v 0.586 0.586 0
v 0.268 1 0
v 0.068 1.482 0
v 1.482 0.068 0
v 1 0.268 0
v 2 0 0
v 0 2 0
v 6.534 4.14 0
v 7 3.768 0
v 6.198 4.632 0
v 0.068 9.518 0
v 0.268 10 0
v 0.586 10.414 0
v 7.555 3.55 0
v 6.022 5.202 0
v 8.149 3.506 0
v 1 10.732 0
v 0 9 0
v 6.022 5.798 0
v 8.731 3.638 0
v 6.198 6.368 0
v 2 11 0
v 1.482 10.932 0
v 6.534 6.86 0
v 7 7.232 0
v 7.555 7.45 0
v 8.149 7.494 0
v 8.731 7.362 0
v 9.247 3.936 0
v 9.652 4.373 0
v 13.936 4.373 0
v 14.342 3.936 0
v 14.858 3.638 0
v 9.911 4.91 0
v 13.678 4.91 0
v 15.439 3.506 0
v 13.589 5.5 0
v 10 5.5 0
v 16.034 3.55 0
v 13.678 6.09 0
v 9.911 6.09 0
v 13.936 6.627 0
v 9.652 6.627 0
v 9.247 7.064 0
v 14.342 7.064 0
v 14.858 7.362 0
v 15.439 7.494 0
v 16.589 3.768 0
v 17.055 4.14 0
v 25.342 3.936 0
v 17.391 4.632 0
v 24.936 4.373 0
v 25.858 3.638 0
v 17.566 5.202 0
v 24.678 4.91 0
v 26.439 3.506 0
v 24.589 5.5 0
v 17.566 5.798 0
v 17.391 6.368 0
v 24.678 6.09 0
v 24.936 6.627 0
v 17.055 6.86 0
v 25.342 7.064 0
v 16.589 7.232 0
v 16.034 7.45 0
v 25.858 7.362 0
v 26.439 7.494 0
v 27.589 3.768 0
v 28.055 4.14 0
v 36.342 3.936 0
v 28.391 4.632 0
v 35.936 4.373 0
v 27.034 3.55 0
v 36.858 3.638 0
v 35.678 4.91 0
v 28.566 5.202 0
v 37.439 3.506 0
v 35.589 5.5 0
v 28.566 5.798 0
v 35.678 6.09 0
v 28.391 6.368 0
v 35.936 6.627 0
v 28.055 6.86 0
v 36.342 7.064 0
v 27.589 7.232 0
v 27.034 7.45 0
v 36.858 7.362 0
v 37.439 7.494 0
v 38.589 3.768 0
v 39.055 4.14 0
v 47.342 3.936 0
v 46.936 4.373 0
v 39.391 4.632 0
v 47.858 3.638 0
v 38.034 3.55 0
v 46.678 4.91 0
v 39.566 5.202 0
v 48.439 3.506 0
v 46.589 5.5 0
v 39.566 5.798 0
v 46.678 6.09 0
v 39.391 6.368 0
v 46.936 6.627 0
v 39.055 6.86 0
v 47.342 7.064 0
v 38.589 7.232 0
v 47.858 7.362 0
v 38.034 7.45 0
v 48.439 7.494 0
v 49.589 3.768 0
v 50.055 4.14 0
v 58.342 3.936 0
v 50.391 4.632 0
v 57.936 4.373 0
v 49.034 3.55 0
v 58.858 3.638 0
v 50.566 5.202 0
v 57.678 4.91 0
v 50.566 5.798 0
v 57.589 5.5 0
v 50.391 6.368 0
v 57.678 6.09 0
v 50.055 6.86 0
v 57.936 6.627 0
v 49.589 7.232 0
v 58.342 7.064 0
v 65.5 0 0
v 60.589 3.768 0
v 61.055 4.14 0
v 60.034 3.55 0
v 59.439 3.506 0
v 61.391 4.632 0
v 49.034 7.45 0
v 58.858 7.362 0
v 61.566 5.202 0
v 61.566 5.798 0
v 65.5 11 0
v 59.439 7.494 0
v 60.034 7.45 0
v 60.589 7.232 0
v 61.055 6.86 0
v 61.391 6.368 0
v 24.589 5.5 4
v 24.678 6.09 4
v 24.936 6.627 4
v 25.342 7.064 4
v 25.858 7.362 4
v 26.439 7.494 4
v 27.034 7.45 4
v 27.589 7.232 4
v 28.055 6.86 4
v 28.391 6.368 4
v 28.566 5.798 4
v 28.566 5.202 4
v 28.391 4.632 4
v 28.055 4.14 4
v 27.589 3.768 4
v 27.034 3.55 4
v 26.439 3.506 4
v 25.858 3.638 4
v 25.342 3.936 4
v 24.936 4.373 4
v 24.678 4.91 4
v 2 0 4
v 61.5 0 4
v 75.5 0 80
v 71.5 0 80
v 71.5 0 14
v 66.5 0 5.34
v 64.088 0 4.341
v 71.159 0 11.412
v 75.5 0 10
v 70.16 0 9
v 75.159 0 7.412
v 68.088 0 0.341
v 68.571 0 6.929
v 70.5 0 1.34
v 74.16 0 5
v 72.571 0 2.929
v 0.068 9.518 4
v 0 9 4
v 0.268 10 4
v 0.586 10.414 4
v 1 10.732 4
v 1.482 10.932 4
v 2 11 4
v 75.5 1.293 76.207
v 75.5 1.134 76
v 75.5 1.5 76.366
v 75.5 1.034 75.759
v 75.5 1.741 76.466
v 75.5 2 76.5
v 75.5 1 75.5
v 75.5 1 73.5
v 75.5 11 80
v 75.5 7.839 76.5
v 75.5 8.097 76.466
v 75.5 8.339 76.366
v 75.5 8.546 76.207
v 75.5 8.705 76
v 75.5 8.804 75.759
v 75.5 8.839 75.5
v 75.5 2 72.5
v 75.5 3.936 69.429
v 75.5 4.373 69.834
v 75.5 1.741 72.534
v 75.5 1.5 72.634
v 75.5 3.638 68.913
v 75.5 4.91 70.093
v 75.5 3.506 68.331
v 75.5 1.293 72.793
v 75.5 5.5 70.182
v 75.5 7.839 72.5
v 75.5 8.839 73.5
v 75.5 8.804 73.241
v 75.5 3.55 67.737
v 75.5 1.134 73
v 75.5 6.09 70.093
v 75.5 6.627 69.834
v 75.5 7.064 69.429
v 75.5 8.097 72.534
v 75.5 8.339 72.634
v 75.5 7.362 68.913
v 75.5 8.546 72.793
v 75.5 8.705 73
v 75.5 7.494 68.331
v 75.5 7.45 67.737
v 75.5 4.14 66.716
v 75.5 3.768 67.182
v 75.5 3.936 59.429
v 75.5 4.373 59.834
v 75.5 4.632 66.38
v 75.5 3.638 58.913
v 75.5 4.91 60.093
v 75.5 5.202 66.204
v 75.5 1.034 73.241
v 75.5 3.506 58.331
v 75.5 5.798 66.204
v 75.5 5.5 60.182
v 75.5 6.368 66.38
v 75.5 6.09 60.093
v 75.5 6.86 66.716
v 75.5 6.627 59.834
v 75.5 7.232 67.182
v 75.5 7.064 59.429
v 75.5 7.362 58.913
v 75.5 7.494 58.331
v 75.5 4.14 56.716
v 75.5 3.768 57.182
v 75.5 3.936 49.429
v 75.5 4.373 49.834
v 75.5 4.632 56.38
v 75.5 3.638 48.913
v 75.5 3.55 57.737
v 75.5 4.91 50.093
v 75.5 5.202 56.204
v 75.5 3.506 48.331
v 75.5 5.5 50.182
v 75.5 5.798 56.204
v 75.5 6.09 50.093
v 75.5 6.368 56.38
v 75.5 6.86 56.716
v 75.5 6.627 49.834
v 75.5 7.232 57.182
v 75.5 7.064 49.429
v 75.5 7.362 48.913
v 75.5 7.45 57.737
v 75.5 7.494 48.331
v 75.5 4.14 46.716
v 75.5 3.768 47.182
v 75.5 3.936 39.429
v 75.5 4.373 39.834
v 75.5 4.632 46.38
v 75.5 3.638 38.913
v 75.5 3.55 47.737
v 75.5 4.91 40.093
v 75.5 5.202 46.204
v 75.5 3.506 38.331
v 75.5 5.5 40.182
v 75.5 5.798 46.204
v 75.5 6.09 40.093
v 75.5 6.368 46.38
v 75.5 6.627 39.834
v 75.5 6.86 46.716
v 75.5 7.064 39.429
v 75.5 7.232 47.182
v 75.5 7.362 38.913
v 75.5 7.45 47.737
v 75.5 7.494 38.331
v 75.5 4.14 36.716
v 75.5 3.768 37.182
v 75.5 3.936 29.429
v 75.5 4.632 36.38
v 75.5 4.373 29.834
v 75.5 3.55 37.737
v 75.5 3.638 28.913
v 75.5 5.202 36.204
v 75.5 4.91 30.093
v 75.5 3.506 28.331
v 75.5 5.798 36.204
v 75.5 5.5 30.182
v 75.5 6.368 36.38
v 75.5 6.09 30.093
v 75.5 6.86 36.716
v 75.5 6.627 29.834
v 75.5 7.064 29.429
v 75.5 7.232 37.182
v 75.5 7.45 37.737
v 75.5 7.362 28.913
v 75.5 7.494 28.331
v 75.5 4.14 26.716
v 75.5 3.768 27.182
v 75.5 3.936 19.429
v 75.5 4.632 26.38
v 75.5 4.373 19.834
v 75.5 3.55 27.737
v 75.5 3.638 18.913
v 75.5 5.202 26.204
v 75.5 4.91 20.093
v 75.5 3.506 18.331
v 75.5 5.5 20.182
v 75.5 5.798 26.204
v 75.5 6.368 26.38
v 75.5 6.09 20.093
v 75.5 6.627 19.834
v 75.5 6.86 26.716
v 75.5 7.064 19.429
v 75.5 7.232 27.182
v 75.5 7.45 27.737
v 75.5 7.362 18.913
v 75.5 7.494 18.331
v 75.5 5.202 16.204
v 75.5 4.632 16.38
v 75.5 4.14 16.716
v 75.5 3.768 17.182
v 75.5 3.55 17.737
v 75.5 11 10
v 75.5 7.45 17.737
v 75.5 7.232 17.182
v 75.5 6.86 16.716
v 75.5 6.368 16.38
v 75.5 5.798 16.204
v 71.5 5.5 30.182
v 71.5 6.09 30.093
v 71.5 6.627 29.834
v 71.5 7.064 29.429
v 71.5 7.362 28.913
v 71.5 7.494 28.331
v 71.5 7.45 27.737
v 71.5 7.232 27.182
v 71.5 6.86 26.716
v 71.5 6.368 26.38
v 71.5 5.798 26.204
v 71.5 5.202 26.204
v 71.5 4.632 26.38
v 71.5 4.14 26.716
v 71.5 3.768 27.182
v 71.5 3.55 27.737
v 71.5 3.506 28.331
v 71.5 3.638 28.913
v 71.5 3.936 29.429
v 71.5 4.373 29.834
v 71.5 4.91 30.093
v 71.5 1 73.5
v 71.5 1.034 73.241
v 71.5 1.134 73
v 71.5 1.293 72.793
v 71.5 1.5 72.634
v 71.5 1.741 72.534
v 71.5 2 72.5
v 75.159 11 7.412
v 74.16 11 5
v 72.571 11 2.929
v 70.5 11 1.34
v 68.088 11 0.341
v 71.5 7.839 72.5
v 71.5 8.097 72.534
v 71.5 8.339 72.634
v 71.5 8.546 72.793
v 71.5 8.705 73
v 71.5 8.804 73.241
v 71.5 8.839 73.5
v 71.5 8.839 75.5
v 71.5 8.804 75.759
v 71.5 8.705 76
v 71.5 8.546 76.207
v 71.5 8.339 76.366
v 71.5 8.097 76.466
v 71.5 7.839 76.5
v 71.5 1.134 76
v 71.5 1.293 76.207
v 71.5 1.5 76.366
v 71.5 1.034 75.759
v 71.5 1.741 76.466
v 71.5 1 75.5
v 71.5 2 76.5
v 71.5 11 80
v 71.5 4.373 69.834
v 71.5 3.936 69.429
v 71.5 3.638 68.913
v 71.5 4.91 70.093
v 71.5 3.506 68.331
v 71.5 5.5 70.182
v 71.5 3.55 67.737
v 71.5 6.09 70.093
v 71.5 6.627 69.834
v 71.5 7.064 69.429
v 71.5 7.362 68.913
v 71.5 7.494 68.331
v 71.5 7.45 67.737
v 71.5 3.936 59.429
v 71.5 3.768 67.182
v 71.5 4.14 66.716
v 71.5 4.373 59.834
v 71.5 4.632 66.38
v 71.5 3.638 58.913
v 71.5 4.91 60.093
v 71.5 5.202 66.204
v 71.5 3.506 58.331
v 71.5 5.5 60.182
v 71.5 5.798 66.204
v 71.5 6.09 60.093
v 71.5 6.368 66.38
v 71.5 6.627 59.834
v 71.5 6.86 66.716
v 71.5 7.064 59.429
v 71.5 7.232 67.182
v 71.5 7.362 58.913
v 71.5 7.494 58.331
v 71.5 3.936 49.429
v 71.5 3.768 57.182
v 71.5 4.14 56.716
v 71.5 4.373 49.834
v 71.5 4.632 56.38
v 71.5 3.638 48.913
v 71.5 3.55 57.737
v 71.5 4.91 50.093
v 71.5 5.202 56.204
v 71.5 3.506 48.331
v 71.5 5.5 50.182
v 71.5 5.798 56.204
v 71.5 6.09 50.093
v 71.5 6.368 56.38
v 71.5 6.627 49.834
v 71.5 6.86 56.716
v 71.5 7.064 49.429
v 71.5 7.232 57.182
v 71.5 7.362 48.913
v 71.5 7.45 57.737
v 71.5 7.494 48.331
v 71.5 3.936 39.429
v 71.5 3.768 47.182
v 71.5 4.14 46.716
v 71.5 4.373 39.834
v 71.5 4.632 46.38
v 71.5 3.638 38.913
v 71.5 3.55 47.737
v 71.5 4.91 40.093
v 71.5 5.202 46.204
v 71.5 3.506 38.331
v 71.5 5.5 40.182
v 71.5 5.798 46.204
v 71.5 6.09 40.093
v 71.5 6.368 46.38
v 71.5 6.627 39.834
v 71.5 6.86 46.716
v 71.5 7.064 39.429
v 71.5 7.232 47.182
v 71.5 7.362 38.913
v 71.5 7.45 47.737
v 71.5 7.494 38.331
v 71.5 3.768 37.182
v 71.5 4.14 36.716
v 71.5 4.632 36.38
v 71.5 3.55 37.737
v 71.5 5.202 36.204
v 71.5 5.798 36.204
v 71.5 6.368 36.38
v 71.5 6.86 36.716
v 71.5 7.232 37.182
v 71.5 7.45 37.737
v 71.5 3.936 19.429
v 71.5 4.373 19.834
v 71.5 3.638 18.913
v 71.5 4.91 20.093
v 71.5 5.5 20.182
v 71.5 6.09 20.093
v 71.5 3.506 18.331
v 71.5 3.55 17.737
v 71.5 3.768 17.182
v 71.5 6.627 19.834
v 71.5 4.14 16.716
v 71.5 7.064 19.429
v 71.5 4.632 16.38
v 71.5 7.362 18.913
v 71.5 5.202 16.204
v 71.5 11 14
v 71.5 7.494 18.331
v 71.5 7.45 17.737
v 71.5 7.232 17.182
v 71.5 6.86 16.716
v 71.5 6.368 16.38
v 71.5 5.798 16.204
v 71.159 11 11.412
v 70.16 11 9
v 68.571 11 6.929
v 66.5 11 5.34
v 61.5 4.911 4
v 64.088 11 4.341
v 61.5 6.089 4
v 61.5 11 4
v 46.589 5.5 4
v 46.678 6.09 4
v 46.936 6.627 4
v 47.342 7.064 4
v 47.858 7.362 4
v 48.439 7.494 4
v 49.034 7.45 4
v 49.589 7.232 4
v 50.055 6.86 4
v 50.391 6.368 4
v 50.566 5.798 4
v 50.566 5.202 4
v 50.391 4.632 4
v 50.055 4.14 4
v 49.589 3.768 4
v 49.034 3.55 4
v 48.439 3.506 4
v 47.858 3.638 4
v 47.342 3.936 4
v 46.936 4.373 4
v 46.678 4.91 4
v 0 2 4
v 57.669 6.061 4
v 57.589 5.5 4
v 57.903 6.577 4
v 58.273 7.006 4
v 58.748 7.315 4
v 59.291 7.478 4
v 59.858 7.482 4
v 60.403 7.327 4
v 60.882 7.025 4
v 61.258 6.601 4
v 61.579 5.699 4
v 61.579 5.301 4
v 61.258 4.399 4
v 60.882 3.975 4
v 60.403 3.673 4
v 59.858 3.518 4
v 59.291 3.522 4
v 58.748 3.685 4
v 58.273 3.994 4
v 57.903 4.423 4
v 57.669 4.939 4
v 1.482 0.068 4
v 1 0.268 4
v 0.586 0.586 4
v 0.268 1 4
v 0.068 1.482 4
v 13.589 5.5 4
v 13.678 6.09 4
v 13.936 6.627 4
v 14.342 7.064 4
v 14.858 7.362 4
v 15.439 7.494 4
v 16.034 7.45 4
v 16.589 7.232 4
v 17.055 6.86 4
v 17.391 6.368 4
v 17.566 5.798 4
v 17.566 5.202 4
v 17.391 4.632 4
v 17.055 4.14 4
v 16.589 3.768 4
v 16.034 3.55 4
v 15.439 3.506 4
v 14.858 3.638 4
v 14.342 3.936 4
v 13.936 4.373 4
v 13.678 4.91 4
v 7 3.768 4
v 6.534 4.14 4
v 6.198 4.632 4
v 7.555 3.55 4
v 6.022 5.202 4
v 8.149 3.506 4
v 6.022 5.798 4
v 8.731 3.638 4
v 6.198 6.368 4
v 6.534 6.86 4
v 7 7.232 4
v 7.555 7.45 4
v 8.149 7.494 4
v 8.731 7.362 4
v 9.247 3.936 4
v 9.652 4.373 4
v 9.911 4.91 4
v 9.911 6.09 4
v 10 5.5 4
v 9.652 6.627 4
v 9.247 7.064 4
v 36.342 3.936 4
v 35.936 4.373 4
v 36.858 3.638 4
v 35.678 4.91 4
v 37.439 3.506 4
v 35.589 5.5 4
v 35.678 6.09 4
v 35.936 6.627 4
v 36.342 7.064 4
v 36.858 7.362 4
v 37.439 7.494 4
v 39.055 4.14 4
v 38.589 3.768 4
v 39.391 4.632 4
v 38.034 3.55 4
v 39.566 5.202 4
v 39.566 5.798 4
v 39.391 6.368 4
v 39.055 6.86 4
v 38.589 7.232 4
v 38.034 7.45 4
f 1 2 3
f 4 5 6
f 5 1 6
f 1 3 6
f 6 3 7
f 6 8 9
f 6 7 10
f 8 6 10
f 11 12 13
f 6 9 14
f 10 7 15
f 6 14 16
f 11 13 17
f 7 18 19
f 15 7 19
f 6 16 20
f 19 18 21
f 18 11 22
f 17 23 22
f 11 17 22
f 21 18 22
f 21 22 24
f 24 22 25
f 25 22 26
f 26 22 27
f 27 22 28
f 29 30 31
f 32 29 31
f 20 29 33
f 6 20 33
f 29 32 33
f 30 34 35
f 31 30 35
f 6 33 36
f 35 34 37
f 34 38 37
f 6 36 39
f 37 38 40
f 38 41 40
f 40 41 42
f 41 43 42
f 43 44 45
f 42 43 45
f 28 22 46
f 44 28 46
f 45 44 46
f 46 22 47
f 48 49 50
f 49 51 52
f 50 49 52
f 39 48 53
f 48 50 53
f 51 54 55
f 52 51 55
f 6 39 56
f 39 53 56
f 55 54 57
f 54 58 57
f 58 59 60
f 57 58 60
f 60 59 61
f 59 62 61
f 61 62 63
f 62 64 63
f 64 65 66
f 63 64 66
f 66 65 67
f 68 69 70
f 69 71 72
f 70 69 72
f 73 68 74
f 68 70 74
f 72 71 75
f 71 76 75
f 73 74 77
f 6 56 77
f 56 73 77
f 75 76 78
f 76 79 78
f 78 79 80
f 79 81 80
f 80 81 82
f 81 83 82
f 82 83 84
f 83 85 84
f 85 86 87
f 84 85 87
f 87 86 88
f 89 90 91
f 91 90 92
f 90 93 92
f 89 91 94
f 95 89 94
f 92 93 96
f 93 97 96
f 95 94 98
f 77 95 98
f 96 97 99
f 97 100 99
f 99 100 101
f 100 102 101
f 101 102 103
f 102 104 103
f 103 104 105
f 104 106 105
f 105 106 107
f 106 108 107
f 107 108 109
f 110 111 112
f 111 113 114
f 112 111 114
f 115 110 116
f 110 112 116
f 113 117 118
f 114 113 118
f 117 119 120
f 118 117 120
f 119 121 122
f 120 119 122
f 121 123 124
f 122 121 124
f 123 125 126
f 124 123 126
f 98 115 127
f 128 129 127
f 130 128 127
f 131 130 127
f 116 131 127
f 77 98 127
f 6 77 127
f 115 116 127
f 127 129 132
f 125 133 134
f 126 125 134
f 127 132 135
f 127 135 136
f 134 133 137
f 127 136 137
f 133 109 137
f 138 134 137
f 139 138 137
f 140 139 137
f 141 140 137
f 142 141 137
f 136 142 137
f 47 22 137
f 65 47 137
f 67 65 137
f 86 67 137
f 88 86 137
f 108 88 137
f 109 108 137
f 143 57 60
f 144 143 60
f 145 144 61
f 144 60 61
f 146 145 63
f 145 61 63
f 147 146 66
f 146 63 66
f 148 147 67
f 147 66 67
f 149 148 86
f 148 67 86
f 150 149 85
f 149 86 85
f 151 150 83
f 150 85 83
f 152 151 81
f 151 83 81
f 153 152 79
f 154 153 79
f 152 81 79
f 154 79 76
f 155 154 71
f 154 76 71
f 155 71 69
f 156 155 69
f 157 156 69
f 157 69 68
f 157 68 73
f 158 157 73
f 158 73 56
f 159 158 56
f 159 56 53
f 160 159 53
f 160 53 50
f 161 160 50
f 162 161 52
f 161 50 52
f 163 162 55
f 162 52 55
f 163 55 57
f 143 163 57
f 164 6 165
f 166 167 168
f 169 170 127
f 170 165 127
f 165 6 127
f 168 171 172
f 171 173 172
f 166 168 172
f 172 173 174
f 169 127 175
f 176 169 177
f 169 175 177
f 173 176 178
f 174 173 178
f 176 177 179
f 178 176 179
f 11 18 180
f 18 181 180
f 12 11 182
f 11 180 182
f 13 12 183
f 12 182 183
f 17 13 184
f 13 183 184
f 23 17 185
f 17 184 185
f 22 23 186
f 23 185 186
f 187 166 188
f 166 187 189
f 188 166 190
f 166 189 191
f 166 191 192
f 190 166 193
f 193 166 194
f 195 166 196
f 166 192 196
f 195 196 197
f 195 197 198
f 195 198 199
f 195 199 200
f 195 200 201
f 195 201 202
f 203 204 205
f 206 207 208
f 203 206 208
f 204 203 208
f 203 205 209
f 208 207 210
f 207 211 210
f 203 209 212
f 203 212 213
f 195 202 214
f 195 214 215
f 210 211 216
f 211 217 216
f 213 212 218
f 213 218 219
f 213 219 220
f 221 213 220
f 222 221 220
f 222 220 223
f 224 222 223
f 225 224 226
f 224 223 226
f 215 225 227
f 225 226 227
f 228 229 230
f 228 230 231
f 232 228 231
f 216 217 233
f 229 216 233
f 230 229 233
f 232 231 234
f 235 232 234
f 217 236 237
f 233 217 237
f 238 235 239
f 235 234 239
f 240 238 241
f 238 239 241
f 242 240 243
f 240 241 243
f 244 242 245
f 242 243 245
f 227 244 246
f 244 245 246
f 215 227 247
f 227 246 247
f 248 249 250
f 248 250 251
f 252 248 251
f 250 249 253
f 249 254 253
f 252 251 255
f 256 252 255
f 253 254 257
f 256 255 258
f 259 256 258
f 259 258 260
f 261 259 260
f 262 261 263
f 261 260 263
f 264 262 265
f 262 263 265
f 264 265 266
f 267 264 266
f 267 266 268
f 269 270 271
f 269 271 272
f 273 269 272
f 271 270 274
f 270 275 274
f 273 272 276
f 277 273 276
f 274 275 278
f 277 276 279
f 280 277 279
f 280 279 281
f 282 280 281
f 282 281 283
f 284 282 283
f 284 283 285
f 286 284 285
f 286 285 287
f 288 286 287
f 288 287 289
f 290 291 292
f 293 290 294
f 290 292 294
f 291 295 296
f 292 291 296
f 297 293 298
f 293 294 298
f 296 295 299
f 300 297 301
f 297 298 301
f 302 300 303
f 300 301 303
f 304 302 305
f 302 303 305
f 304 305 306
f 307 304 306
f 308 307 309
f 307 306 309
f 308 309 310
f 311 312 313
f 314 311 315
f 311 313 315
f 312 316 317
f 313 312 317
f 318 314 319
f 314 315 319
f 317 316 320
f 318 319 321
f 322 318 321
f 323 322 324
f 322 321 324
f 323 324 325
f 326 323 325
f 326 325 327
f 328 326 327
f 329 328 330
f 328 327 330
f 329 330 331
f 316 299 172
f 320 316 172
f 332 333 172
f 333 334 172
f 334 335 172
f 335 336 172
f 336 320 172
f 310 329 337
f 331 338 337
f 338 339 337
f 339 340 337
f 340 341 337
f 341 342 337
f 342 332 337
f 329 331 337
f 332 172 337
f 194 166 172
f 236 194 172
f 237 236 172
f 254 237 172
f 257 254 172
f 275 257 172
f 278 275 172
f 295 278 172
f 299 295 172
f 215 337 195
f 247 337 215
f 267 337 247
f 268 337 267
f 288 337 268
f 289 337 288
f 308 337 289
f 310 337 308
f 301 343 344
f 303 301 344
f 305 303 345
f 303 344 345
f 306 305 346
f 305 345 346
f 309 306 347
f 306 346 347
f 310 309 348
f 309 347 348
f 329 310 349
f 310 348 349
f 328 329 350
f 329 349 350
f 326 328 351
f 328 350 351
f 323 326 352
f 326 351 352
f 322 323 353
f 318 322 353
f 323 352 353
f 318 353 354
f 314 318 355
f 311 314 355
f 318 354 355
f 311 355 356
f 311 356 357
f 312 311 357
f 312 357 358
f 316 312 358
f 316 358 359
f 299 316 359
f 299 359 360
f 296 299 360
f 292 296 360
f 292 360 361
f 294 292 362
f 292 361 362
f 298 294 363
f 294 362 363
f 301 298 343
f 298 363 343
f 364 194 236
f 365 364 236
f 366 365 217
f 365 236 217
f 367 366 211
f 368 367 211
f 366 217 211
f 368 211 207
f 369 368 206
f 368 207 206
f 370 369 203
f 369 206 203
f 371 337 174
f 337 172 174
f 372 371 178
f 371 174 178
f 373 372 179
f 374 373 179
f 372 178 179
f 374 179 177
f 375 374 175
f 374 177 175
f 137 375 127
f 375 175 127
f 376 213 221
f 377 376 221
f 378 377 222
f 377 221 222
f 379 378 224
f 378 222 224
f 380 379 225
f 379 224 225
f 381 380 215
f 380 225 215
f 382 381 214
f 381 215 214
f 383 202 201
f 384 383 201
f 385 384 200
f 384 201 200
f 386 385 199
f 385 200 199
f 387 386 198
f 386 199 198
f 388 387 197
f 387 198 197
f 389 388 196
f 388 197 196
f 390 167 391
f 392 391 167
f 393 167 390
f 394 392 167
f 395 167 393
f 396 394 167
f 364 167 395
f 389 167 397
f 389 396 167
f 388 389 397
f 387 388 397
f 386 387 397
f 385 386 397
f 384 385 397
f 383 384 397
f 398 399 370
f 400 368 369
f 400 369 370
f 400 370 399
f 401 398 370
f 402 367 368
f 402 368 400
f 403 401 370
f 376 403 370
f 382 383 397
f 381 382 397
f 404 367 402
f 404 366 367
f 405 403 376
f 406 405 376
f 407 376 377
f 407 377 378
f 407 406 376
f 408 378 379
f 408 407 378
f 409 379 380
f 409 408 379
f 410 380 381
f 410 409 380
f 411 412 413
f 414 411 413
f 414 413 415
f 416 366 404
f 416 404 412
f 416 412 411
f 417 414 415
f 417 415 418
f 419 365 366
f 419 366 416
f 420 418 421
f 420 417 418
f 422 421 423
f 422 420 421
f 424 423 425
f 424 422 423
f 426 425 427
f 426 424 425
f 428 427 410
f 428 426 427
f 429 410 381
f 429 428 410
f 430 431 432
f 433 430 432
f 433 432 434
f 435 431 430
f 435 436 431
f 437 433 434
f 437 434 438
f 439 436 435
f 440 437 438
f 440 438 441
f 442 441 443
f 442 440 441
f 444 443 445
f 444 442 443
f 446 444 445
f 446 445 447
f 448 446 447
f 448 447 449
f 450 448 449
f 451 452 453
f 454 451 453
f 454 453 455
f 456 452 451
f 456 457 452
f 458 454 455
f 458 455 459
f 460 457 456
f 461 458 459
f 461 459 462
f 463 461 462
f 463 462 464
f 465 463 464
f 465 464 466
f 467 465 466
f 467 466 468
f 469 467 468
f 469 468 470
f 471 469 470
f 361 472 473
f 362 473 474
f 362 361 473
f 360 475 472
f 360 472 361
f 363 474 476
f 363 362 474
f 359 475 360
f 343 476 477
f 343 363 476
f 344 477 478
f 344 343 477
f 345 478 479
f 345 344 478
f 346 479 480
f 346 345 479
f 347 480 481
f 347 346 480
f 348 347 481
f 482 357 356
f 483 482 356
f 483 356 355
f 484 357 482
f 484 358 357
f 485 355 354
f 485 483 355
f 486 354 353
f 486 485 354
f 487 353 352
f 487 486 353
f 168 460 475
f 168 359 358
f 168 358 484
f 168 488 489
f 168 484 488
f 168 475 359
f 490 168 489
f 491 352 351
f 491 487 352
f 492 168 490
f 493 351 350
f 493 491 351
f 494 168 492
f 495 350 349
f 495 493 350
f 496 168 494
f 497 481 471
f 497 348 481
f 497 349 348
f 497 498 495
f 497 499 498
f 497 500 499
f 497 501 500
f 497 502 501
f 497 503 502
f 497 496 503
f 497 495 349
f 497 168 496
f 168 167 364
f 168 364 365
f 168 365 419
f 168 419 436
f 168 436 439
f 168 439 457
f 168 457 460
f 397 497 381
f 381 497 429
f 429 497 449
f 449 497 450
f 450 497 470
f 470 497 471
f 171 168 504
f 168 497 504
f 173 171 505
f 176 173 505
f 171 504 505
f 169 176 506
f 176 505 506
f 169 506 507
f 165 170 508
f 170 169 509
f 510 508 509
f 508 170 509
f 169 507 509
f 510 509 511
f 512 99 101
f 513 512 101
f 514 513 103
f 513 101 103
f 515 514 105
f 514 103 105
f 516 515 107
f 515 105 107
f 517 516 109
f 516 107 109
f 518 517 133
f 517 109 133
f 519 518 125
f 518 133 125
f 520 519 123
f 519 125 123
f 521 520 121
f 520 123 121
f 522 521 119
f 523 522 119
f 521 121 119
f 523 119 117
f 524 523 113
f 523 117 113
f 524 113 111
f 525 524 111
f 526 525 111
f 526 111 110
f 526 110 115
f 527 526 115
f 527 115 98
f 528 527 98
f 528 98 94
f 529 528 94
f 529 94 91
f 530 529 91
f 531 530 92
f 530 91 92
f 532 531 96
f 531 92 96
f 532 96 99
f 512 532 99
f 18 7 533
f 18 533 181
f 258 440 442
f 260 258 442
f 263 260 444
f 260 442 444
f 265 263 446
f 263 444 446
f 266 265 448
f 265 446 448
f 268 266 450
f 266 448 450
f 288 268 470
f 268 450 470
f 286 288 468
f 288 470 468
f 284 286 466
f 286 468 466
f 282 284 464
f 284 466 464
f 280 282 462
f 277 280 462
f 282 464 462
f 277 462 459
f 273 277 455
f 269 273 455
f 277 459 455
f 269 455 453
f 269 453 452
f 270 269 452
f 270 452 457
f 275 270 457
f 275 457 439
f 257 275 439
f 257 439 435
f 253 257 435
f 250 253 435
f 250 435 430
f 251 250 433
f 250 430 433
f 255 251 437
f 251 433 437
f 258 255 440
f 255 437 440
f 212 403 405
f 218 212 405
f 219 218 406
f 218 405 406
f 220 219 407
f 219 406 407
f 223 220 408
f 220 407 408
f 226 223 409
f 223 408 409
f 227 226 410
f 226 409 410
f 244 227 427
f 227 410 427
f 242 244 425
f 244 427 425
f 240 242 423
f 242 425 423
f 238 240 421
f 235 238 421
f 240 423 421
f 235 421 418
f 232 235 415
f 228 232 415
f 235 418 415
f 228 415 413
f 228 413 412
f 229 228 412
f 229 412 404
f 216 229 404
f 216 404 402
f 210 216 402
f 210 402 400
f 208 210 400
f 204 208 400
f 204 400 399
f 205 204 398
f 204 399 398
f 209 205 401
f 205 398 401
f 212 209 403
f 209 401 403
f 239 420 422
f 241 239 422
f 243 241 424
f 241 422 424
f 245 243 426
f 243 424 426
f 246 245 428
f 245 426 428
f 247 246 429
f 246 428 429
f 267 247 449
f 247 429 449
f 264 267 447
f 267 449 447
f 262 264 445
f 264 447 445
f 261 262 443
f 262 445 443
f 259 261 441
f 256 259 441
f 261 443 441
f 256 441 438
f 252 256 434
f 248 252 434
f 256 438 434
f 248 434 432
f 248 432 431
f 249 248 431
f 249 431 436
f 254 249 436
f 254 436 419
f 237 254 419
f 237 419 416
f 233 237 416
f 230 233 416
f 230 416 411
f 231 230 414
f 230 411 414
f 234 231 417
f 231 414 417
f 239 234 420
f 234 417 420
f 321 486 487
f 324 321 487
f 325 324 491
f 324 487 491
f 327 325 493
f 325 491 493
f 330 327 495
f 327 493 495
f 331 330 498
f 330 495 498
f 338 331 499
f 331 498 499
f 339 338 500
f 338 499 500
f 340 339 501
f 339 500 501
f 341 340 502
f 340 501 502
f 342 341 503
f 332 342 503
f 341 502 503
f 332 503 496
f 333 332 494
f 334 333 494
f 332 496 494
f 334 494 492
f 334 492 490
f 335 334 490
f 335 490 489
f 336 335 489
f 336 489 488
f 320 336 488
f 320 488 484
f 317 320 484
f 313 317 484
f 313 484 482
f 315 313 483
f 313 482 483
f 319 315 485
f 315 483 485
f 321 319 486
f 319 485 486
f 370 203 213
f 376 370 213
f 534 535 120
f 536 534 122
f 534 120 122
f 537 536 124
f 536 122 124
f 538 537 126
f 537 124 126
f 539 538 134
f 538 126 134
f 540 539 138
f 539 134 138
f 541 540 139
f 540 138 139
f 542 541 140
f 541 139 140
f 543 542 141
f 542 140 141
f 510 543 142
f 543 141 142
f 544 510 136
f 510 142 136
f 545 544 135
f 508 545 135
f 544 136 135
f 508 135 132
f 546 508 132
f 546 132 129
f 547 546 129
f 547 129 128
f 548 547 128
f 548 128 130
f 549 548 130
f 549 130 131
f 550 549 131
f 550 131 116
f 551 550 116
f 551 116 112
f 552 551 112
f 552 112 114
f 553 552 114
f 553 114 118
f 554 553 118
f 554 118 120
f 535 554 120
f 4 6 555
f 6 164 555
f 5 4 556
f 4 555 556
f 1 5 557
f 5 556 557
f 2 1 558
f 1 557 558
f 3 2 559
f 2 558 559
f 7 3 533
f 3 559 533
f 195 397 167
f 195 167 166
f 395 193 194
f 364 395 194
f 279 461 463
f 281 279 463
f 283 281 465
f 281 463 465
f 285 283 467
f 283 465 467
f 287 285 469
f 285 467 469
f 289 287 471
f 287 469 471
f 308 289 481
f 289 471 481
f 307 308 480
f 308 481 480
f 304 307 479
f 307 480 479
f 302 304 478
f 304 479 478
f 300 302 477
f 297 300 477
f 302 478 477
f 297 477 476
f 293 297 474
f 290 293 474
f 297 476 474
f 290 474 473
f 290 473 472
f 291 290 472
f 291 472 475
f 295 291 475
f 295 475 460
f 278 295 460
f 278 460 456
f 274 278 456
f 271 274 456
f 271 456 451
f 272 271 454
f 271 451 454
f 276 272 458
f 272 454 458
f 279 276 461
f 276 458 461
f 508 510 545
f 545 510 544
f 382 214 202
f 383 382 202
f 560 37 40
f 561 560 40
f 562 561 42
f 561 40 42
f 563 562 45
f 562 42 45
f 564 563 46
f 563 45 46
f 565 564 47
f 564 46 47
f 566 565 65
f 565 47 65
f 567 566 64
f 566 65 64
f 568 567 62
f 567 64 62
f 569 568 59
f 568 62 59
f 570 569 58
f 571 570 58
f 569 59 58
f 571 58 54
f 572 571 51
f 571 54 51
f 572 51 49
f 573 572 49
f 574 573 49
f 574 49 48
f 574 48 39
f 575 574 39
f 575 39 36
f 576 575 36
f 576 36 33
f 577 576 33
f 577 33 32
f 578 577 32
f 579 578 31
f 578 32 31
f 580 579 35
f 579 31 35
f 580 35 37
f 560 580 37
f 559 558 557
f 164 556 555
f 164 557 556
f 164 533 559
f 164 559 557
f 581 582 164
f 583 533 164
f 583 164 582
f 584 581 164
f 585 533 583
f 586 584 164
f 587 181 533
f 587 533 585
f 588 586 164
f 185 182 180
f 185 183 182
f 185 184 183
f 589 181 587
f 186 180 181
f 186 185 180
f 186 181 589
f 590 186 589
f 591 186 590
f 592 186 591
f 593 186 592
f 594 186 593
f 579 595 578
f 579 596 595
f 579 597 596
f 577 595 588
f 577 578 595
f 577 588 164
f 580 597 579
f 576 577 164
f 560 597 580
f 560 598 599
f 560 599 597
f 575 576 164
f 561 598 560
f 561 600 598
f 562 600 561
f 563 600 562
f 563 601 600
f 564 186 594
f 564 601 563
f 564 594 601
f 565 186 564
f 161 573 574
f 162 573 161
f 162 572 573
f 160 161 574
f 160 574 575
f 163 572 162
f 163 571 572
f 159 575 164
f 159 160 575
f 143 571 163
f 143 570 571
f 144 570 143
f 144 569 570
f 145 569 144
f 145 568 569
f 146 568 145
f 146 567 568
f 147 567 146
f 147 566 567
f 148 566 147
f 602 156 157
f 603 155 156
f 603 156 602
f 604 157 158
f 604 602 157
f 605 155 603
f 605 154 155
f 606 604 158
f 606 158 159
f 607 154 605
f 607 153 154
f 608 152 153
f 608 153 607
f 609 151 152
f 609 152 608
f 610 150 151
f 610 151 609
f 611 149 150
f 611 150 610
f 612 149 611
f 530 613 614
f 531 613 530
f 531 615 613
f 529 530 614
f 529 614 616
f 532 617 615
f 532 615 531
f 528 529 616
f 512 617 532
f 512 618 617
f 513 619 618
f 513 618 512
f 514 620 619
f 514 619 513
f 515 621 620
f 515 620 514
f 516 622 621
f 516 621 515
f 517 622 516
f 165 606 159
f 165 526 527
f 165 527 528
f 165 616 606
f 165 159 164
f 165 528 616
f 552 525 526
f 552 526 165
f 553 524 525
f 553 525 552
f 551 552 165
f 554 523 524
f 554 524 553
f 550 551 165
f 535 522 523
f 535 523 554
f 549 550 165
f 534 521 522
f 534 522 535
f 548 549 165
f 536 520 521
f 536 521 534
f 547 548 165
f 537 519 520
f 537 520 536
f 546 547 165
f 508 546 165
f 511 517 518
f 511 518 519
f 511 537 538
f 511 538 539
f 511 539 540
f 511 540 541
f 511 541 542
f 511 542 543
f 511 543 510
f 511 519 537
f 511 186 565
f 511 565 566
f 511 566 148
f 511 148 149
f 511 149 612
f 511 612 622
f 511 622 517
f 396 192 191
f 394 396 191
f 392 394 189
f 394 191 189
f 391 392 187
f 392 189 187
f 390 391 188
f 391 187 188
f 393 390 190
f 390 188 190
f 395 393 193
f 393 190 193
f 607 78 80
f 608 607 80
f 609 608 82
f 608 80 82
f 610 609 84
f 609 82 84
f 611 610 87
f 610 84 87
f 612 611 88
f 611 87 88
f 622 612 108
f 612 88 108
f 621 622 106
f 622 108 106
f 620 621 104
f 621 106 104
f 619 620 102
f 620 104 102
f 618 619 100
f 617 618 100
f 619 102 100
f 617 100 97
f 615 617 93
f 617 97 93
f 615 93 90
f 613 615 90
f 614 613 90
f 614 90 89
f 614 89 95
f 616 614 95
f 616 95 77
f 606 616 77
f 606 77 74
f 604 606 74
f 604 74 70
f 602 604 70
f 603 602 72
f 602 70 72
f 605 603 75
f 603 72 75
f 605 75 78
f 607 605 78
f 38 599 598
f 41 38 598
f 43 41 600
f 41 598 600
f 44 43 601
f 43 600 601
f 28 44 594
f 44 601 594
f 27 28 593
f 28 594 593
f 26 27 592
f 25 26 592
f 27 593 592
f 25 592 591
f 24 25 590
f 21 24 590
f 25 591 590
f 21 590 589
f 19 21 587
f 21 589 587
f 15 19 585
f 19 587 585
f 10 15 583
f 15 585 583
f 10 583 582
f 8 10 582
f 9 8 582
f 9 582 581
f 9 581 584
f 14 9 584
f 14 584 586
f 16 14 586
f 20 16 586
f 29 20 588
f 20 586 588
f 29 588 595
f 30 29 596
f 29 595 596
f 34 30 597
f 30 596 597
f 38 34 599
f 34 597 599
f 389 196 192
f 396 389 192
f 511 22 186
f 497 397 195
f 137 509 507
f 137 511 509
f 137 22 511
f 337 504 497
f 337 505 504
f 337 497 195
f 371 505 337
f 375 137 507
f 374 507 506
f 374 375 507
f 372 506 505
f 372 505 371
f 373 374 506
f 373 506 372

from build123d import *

# Parameters (mm, degrees)
SKETCH2_W           = 71.5
SKETCH2_H           = 11
BOSS_EXTRUDE2_DEPTH = 4
SKETCH3_R           = 2
CUT_EXTRUDE1_DEPTH  = 4
SKETCH4_W           = 4
SKETCH4_H           = 4
BOSS_EXTRUDE3_DEPTH = 11
SKETCH5_W           = 4
SKETCH5_H           = 11
BOSS_EXTRUDE4_DEPTH = 76
CUT_EXTRUDE2_DEPTH  = 4
FILLET1_R           = 10
FILLET2_R           = 10
FILLET4_R           = 2
SKETCH7_R           = 2
CUT_EXTRUDE3_DEPTH  = 4
SKETCH8_R           = 2
CUT_EXTRUDE4_DEPTH  = 4


with BuildPart() as part:
    # Sketch2 → Boss-Extrude2 (new body)
    with BuildSketch(Plane.XY):
        with Locations((35.75, 5.5)):
            Rectangle(SKETCH2_W, SKETCH2_H)
    extrude(amount=BOSS_EXTRUDE2_DEPTH)

    # Sketch3 → Cut-Extrude1 (cut)
    with BuildSketch(Plane.XY.offset(4)):
        with Locations((8, 5.5)):
            Circle(SKETCH3_R)
    extrude(amount=-CUT_EXTRUDE1_DEPTH, mode=Mode.SUBTRACT)

    # Sketch4 → Boss-Extrude3 (add)
    with BuildSketch(Plane(origin=(0, 11, 0), x_dir=(1, 0, 0), z_dir=(0, 1, 0))):
        with Locations((73.5, -2)):
            Rectangle(SKETCH4_W, SKETCH4_H)
    extrude(amount=-BOSS_EXTRUDE3_DEPTH)

    # Sketch5 → Boss-Extrude4 (add)
    with BuildSketch(Plane.XY.offset(4)):
        with Locations((73.5, 5.5)):
            Rectangle(SKETCH5_W, SKETCH5_H)
    extrude(amount=BOSS_EXTRUDE4_DEPTH)

    # Sketch6 → Cut-Extrude2 (cut)
    with BuildSketch(Plane(origin=(75.5, 0, 0), x_dir=(0, 0, -1), z_dir=(1, 0, 0))):
        with BuildLine():
            Line((-75.5, 1), (-73.5, 1))
            ThreePointArc((-73.5, 1), (-72.792893219, 1.292893219), (-72.5, 2))
            Line((-72.5, 2), (-72.5, 7.838562936))
            ThreePointArc((-72.5, 7.838562936), (-72.792893219, 8.545669717), (-73.5, 8.838562936))
            Line((-73.5, 8.838562936), (-75.5, 8.838562936))
            ThreePointArc((-75.5, 8.838562936), (-76.207106781, 8.545669717), (-76.5, 7.838562936))
            Line((-76.5, 7.838562936), (-76.5, 2))
            ThreePointArc((-76.5, 2), (-76.207106781, 1.292893219), (-75.5, 1))
        make_face()
    extrude(amount=-CUT_EXTRUDE2_DEPTH, mode=Mode.SUBTRACT)

    # Fillet1
    fillet1_edges = [part.edges().sort_by_distance(p)[0] for p in [
        (71.5, 5.5, 4),
    ]]
    fillet(fillet1_edges, radius=FILLET1_R)

    # Fillet2
    fillet2_edges = [part.edges().sort_by_distance(p)[0] for p in [
        (75.5, 5.5, 0),
    ]]
    fillet(fillet2_edges, radius=FILLET2_R)

    # Fillet4
    fillet4_edges = [part.edges().sort_by_distance(p)[0] for p in [
        (0, 11, 2),
        (0, 0, 2),
    ]]
    fillet(fillet4_edges, radius=FILLET4_R)

    # Sketch7 → Cut-Extrude3 (cut)
    with BuildSketch(Plane(origin=(0, 0, 0), x_dir=(-1, 0, 0), z_dir=(0, 0, -1))):
        with Locations((-15.588658676, 5.5)):
            Circle(SKETCH7_R)
        with Locations((-26.588658676, 5.5)):
            Circle(SKETCH7_R)
        with Locations((-37.588658676, 5.5)):
            Circle(SKETCH7_R)
        with Locations((-48.588658676, 5.5)):
            Circle(SKETCH7_R)
        with Locations((-59.588658676, 5.5)):
            Circle(SKETCH7_R)
    extrude(amount=-CUT_EXTRUDE3_DEPTH, mode=Mode.SUBTRACT)

    # Sketch8 → Cut-Extrude4 (cut)
    with BuildSketch(Plane.ZY.offset(-71.5)):
        with Locations((18.18197142, 5.5)):
            Circle(SKETCH8_R)
        with Locations((28.18197142, 5.5)):
            Circle(SKETCH8_R)
        with Locations((38.18197142, 5.5)):
            Circle(SKETCH8_R)
        with Locations((48.18197142, 5.5)):
            Circle(SKETCH8_R)
        with Locations((58.18197142, 5.5)):
            Circle(SKETCH8_R)
        with Locations((68.18197142, 5.5)):
            Circle(SKETCH8_R)
    extrude(amount=-CUT_EXTRUDE4_DEPTH, mode=Mode.SUBTRACT)


solid = part.part
